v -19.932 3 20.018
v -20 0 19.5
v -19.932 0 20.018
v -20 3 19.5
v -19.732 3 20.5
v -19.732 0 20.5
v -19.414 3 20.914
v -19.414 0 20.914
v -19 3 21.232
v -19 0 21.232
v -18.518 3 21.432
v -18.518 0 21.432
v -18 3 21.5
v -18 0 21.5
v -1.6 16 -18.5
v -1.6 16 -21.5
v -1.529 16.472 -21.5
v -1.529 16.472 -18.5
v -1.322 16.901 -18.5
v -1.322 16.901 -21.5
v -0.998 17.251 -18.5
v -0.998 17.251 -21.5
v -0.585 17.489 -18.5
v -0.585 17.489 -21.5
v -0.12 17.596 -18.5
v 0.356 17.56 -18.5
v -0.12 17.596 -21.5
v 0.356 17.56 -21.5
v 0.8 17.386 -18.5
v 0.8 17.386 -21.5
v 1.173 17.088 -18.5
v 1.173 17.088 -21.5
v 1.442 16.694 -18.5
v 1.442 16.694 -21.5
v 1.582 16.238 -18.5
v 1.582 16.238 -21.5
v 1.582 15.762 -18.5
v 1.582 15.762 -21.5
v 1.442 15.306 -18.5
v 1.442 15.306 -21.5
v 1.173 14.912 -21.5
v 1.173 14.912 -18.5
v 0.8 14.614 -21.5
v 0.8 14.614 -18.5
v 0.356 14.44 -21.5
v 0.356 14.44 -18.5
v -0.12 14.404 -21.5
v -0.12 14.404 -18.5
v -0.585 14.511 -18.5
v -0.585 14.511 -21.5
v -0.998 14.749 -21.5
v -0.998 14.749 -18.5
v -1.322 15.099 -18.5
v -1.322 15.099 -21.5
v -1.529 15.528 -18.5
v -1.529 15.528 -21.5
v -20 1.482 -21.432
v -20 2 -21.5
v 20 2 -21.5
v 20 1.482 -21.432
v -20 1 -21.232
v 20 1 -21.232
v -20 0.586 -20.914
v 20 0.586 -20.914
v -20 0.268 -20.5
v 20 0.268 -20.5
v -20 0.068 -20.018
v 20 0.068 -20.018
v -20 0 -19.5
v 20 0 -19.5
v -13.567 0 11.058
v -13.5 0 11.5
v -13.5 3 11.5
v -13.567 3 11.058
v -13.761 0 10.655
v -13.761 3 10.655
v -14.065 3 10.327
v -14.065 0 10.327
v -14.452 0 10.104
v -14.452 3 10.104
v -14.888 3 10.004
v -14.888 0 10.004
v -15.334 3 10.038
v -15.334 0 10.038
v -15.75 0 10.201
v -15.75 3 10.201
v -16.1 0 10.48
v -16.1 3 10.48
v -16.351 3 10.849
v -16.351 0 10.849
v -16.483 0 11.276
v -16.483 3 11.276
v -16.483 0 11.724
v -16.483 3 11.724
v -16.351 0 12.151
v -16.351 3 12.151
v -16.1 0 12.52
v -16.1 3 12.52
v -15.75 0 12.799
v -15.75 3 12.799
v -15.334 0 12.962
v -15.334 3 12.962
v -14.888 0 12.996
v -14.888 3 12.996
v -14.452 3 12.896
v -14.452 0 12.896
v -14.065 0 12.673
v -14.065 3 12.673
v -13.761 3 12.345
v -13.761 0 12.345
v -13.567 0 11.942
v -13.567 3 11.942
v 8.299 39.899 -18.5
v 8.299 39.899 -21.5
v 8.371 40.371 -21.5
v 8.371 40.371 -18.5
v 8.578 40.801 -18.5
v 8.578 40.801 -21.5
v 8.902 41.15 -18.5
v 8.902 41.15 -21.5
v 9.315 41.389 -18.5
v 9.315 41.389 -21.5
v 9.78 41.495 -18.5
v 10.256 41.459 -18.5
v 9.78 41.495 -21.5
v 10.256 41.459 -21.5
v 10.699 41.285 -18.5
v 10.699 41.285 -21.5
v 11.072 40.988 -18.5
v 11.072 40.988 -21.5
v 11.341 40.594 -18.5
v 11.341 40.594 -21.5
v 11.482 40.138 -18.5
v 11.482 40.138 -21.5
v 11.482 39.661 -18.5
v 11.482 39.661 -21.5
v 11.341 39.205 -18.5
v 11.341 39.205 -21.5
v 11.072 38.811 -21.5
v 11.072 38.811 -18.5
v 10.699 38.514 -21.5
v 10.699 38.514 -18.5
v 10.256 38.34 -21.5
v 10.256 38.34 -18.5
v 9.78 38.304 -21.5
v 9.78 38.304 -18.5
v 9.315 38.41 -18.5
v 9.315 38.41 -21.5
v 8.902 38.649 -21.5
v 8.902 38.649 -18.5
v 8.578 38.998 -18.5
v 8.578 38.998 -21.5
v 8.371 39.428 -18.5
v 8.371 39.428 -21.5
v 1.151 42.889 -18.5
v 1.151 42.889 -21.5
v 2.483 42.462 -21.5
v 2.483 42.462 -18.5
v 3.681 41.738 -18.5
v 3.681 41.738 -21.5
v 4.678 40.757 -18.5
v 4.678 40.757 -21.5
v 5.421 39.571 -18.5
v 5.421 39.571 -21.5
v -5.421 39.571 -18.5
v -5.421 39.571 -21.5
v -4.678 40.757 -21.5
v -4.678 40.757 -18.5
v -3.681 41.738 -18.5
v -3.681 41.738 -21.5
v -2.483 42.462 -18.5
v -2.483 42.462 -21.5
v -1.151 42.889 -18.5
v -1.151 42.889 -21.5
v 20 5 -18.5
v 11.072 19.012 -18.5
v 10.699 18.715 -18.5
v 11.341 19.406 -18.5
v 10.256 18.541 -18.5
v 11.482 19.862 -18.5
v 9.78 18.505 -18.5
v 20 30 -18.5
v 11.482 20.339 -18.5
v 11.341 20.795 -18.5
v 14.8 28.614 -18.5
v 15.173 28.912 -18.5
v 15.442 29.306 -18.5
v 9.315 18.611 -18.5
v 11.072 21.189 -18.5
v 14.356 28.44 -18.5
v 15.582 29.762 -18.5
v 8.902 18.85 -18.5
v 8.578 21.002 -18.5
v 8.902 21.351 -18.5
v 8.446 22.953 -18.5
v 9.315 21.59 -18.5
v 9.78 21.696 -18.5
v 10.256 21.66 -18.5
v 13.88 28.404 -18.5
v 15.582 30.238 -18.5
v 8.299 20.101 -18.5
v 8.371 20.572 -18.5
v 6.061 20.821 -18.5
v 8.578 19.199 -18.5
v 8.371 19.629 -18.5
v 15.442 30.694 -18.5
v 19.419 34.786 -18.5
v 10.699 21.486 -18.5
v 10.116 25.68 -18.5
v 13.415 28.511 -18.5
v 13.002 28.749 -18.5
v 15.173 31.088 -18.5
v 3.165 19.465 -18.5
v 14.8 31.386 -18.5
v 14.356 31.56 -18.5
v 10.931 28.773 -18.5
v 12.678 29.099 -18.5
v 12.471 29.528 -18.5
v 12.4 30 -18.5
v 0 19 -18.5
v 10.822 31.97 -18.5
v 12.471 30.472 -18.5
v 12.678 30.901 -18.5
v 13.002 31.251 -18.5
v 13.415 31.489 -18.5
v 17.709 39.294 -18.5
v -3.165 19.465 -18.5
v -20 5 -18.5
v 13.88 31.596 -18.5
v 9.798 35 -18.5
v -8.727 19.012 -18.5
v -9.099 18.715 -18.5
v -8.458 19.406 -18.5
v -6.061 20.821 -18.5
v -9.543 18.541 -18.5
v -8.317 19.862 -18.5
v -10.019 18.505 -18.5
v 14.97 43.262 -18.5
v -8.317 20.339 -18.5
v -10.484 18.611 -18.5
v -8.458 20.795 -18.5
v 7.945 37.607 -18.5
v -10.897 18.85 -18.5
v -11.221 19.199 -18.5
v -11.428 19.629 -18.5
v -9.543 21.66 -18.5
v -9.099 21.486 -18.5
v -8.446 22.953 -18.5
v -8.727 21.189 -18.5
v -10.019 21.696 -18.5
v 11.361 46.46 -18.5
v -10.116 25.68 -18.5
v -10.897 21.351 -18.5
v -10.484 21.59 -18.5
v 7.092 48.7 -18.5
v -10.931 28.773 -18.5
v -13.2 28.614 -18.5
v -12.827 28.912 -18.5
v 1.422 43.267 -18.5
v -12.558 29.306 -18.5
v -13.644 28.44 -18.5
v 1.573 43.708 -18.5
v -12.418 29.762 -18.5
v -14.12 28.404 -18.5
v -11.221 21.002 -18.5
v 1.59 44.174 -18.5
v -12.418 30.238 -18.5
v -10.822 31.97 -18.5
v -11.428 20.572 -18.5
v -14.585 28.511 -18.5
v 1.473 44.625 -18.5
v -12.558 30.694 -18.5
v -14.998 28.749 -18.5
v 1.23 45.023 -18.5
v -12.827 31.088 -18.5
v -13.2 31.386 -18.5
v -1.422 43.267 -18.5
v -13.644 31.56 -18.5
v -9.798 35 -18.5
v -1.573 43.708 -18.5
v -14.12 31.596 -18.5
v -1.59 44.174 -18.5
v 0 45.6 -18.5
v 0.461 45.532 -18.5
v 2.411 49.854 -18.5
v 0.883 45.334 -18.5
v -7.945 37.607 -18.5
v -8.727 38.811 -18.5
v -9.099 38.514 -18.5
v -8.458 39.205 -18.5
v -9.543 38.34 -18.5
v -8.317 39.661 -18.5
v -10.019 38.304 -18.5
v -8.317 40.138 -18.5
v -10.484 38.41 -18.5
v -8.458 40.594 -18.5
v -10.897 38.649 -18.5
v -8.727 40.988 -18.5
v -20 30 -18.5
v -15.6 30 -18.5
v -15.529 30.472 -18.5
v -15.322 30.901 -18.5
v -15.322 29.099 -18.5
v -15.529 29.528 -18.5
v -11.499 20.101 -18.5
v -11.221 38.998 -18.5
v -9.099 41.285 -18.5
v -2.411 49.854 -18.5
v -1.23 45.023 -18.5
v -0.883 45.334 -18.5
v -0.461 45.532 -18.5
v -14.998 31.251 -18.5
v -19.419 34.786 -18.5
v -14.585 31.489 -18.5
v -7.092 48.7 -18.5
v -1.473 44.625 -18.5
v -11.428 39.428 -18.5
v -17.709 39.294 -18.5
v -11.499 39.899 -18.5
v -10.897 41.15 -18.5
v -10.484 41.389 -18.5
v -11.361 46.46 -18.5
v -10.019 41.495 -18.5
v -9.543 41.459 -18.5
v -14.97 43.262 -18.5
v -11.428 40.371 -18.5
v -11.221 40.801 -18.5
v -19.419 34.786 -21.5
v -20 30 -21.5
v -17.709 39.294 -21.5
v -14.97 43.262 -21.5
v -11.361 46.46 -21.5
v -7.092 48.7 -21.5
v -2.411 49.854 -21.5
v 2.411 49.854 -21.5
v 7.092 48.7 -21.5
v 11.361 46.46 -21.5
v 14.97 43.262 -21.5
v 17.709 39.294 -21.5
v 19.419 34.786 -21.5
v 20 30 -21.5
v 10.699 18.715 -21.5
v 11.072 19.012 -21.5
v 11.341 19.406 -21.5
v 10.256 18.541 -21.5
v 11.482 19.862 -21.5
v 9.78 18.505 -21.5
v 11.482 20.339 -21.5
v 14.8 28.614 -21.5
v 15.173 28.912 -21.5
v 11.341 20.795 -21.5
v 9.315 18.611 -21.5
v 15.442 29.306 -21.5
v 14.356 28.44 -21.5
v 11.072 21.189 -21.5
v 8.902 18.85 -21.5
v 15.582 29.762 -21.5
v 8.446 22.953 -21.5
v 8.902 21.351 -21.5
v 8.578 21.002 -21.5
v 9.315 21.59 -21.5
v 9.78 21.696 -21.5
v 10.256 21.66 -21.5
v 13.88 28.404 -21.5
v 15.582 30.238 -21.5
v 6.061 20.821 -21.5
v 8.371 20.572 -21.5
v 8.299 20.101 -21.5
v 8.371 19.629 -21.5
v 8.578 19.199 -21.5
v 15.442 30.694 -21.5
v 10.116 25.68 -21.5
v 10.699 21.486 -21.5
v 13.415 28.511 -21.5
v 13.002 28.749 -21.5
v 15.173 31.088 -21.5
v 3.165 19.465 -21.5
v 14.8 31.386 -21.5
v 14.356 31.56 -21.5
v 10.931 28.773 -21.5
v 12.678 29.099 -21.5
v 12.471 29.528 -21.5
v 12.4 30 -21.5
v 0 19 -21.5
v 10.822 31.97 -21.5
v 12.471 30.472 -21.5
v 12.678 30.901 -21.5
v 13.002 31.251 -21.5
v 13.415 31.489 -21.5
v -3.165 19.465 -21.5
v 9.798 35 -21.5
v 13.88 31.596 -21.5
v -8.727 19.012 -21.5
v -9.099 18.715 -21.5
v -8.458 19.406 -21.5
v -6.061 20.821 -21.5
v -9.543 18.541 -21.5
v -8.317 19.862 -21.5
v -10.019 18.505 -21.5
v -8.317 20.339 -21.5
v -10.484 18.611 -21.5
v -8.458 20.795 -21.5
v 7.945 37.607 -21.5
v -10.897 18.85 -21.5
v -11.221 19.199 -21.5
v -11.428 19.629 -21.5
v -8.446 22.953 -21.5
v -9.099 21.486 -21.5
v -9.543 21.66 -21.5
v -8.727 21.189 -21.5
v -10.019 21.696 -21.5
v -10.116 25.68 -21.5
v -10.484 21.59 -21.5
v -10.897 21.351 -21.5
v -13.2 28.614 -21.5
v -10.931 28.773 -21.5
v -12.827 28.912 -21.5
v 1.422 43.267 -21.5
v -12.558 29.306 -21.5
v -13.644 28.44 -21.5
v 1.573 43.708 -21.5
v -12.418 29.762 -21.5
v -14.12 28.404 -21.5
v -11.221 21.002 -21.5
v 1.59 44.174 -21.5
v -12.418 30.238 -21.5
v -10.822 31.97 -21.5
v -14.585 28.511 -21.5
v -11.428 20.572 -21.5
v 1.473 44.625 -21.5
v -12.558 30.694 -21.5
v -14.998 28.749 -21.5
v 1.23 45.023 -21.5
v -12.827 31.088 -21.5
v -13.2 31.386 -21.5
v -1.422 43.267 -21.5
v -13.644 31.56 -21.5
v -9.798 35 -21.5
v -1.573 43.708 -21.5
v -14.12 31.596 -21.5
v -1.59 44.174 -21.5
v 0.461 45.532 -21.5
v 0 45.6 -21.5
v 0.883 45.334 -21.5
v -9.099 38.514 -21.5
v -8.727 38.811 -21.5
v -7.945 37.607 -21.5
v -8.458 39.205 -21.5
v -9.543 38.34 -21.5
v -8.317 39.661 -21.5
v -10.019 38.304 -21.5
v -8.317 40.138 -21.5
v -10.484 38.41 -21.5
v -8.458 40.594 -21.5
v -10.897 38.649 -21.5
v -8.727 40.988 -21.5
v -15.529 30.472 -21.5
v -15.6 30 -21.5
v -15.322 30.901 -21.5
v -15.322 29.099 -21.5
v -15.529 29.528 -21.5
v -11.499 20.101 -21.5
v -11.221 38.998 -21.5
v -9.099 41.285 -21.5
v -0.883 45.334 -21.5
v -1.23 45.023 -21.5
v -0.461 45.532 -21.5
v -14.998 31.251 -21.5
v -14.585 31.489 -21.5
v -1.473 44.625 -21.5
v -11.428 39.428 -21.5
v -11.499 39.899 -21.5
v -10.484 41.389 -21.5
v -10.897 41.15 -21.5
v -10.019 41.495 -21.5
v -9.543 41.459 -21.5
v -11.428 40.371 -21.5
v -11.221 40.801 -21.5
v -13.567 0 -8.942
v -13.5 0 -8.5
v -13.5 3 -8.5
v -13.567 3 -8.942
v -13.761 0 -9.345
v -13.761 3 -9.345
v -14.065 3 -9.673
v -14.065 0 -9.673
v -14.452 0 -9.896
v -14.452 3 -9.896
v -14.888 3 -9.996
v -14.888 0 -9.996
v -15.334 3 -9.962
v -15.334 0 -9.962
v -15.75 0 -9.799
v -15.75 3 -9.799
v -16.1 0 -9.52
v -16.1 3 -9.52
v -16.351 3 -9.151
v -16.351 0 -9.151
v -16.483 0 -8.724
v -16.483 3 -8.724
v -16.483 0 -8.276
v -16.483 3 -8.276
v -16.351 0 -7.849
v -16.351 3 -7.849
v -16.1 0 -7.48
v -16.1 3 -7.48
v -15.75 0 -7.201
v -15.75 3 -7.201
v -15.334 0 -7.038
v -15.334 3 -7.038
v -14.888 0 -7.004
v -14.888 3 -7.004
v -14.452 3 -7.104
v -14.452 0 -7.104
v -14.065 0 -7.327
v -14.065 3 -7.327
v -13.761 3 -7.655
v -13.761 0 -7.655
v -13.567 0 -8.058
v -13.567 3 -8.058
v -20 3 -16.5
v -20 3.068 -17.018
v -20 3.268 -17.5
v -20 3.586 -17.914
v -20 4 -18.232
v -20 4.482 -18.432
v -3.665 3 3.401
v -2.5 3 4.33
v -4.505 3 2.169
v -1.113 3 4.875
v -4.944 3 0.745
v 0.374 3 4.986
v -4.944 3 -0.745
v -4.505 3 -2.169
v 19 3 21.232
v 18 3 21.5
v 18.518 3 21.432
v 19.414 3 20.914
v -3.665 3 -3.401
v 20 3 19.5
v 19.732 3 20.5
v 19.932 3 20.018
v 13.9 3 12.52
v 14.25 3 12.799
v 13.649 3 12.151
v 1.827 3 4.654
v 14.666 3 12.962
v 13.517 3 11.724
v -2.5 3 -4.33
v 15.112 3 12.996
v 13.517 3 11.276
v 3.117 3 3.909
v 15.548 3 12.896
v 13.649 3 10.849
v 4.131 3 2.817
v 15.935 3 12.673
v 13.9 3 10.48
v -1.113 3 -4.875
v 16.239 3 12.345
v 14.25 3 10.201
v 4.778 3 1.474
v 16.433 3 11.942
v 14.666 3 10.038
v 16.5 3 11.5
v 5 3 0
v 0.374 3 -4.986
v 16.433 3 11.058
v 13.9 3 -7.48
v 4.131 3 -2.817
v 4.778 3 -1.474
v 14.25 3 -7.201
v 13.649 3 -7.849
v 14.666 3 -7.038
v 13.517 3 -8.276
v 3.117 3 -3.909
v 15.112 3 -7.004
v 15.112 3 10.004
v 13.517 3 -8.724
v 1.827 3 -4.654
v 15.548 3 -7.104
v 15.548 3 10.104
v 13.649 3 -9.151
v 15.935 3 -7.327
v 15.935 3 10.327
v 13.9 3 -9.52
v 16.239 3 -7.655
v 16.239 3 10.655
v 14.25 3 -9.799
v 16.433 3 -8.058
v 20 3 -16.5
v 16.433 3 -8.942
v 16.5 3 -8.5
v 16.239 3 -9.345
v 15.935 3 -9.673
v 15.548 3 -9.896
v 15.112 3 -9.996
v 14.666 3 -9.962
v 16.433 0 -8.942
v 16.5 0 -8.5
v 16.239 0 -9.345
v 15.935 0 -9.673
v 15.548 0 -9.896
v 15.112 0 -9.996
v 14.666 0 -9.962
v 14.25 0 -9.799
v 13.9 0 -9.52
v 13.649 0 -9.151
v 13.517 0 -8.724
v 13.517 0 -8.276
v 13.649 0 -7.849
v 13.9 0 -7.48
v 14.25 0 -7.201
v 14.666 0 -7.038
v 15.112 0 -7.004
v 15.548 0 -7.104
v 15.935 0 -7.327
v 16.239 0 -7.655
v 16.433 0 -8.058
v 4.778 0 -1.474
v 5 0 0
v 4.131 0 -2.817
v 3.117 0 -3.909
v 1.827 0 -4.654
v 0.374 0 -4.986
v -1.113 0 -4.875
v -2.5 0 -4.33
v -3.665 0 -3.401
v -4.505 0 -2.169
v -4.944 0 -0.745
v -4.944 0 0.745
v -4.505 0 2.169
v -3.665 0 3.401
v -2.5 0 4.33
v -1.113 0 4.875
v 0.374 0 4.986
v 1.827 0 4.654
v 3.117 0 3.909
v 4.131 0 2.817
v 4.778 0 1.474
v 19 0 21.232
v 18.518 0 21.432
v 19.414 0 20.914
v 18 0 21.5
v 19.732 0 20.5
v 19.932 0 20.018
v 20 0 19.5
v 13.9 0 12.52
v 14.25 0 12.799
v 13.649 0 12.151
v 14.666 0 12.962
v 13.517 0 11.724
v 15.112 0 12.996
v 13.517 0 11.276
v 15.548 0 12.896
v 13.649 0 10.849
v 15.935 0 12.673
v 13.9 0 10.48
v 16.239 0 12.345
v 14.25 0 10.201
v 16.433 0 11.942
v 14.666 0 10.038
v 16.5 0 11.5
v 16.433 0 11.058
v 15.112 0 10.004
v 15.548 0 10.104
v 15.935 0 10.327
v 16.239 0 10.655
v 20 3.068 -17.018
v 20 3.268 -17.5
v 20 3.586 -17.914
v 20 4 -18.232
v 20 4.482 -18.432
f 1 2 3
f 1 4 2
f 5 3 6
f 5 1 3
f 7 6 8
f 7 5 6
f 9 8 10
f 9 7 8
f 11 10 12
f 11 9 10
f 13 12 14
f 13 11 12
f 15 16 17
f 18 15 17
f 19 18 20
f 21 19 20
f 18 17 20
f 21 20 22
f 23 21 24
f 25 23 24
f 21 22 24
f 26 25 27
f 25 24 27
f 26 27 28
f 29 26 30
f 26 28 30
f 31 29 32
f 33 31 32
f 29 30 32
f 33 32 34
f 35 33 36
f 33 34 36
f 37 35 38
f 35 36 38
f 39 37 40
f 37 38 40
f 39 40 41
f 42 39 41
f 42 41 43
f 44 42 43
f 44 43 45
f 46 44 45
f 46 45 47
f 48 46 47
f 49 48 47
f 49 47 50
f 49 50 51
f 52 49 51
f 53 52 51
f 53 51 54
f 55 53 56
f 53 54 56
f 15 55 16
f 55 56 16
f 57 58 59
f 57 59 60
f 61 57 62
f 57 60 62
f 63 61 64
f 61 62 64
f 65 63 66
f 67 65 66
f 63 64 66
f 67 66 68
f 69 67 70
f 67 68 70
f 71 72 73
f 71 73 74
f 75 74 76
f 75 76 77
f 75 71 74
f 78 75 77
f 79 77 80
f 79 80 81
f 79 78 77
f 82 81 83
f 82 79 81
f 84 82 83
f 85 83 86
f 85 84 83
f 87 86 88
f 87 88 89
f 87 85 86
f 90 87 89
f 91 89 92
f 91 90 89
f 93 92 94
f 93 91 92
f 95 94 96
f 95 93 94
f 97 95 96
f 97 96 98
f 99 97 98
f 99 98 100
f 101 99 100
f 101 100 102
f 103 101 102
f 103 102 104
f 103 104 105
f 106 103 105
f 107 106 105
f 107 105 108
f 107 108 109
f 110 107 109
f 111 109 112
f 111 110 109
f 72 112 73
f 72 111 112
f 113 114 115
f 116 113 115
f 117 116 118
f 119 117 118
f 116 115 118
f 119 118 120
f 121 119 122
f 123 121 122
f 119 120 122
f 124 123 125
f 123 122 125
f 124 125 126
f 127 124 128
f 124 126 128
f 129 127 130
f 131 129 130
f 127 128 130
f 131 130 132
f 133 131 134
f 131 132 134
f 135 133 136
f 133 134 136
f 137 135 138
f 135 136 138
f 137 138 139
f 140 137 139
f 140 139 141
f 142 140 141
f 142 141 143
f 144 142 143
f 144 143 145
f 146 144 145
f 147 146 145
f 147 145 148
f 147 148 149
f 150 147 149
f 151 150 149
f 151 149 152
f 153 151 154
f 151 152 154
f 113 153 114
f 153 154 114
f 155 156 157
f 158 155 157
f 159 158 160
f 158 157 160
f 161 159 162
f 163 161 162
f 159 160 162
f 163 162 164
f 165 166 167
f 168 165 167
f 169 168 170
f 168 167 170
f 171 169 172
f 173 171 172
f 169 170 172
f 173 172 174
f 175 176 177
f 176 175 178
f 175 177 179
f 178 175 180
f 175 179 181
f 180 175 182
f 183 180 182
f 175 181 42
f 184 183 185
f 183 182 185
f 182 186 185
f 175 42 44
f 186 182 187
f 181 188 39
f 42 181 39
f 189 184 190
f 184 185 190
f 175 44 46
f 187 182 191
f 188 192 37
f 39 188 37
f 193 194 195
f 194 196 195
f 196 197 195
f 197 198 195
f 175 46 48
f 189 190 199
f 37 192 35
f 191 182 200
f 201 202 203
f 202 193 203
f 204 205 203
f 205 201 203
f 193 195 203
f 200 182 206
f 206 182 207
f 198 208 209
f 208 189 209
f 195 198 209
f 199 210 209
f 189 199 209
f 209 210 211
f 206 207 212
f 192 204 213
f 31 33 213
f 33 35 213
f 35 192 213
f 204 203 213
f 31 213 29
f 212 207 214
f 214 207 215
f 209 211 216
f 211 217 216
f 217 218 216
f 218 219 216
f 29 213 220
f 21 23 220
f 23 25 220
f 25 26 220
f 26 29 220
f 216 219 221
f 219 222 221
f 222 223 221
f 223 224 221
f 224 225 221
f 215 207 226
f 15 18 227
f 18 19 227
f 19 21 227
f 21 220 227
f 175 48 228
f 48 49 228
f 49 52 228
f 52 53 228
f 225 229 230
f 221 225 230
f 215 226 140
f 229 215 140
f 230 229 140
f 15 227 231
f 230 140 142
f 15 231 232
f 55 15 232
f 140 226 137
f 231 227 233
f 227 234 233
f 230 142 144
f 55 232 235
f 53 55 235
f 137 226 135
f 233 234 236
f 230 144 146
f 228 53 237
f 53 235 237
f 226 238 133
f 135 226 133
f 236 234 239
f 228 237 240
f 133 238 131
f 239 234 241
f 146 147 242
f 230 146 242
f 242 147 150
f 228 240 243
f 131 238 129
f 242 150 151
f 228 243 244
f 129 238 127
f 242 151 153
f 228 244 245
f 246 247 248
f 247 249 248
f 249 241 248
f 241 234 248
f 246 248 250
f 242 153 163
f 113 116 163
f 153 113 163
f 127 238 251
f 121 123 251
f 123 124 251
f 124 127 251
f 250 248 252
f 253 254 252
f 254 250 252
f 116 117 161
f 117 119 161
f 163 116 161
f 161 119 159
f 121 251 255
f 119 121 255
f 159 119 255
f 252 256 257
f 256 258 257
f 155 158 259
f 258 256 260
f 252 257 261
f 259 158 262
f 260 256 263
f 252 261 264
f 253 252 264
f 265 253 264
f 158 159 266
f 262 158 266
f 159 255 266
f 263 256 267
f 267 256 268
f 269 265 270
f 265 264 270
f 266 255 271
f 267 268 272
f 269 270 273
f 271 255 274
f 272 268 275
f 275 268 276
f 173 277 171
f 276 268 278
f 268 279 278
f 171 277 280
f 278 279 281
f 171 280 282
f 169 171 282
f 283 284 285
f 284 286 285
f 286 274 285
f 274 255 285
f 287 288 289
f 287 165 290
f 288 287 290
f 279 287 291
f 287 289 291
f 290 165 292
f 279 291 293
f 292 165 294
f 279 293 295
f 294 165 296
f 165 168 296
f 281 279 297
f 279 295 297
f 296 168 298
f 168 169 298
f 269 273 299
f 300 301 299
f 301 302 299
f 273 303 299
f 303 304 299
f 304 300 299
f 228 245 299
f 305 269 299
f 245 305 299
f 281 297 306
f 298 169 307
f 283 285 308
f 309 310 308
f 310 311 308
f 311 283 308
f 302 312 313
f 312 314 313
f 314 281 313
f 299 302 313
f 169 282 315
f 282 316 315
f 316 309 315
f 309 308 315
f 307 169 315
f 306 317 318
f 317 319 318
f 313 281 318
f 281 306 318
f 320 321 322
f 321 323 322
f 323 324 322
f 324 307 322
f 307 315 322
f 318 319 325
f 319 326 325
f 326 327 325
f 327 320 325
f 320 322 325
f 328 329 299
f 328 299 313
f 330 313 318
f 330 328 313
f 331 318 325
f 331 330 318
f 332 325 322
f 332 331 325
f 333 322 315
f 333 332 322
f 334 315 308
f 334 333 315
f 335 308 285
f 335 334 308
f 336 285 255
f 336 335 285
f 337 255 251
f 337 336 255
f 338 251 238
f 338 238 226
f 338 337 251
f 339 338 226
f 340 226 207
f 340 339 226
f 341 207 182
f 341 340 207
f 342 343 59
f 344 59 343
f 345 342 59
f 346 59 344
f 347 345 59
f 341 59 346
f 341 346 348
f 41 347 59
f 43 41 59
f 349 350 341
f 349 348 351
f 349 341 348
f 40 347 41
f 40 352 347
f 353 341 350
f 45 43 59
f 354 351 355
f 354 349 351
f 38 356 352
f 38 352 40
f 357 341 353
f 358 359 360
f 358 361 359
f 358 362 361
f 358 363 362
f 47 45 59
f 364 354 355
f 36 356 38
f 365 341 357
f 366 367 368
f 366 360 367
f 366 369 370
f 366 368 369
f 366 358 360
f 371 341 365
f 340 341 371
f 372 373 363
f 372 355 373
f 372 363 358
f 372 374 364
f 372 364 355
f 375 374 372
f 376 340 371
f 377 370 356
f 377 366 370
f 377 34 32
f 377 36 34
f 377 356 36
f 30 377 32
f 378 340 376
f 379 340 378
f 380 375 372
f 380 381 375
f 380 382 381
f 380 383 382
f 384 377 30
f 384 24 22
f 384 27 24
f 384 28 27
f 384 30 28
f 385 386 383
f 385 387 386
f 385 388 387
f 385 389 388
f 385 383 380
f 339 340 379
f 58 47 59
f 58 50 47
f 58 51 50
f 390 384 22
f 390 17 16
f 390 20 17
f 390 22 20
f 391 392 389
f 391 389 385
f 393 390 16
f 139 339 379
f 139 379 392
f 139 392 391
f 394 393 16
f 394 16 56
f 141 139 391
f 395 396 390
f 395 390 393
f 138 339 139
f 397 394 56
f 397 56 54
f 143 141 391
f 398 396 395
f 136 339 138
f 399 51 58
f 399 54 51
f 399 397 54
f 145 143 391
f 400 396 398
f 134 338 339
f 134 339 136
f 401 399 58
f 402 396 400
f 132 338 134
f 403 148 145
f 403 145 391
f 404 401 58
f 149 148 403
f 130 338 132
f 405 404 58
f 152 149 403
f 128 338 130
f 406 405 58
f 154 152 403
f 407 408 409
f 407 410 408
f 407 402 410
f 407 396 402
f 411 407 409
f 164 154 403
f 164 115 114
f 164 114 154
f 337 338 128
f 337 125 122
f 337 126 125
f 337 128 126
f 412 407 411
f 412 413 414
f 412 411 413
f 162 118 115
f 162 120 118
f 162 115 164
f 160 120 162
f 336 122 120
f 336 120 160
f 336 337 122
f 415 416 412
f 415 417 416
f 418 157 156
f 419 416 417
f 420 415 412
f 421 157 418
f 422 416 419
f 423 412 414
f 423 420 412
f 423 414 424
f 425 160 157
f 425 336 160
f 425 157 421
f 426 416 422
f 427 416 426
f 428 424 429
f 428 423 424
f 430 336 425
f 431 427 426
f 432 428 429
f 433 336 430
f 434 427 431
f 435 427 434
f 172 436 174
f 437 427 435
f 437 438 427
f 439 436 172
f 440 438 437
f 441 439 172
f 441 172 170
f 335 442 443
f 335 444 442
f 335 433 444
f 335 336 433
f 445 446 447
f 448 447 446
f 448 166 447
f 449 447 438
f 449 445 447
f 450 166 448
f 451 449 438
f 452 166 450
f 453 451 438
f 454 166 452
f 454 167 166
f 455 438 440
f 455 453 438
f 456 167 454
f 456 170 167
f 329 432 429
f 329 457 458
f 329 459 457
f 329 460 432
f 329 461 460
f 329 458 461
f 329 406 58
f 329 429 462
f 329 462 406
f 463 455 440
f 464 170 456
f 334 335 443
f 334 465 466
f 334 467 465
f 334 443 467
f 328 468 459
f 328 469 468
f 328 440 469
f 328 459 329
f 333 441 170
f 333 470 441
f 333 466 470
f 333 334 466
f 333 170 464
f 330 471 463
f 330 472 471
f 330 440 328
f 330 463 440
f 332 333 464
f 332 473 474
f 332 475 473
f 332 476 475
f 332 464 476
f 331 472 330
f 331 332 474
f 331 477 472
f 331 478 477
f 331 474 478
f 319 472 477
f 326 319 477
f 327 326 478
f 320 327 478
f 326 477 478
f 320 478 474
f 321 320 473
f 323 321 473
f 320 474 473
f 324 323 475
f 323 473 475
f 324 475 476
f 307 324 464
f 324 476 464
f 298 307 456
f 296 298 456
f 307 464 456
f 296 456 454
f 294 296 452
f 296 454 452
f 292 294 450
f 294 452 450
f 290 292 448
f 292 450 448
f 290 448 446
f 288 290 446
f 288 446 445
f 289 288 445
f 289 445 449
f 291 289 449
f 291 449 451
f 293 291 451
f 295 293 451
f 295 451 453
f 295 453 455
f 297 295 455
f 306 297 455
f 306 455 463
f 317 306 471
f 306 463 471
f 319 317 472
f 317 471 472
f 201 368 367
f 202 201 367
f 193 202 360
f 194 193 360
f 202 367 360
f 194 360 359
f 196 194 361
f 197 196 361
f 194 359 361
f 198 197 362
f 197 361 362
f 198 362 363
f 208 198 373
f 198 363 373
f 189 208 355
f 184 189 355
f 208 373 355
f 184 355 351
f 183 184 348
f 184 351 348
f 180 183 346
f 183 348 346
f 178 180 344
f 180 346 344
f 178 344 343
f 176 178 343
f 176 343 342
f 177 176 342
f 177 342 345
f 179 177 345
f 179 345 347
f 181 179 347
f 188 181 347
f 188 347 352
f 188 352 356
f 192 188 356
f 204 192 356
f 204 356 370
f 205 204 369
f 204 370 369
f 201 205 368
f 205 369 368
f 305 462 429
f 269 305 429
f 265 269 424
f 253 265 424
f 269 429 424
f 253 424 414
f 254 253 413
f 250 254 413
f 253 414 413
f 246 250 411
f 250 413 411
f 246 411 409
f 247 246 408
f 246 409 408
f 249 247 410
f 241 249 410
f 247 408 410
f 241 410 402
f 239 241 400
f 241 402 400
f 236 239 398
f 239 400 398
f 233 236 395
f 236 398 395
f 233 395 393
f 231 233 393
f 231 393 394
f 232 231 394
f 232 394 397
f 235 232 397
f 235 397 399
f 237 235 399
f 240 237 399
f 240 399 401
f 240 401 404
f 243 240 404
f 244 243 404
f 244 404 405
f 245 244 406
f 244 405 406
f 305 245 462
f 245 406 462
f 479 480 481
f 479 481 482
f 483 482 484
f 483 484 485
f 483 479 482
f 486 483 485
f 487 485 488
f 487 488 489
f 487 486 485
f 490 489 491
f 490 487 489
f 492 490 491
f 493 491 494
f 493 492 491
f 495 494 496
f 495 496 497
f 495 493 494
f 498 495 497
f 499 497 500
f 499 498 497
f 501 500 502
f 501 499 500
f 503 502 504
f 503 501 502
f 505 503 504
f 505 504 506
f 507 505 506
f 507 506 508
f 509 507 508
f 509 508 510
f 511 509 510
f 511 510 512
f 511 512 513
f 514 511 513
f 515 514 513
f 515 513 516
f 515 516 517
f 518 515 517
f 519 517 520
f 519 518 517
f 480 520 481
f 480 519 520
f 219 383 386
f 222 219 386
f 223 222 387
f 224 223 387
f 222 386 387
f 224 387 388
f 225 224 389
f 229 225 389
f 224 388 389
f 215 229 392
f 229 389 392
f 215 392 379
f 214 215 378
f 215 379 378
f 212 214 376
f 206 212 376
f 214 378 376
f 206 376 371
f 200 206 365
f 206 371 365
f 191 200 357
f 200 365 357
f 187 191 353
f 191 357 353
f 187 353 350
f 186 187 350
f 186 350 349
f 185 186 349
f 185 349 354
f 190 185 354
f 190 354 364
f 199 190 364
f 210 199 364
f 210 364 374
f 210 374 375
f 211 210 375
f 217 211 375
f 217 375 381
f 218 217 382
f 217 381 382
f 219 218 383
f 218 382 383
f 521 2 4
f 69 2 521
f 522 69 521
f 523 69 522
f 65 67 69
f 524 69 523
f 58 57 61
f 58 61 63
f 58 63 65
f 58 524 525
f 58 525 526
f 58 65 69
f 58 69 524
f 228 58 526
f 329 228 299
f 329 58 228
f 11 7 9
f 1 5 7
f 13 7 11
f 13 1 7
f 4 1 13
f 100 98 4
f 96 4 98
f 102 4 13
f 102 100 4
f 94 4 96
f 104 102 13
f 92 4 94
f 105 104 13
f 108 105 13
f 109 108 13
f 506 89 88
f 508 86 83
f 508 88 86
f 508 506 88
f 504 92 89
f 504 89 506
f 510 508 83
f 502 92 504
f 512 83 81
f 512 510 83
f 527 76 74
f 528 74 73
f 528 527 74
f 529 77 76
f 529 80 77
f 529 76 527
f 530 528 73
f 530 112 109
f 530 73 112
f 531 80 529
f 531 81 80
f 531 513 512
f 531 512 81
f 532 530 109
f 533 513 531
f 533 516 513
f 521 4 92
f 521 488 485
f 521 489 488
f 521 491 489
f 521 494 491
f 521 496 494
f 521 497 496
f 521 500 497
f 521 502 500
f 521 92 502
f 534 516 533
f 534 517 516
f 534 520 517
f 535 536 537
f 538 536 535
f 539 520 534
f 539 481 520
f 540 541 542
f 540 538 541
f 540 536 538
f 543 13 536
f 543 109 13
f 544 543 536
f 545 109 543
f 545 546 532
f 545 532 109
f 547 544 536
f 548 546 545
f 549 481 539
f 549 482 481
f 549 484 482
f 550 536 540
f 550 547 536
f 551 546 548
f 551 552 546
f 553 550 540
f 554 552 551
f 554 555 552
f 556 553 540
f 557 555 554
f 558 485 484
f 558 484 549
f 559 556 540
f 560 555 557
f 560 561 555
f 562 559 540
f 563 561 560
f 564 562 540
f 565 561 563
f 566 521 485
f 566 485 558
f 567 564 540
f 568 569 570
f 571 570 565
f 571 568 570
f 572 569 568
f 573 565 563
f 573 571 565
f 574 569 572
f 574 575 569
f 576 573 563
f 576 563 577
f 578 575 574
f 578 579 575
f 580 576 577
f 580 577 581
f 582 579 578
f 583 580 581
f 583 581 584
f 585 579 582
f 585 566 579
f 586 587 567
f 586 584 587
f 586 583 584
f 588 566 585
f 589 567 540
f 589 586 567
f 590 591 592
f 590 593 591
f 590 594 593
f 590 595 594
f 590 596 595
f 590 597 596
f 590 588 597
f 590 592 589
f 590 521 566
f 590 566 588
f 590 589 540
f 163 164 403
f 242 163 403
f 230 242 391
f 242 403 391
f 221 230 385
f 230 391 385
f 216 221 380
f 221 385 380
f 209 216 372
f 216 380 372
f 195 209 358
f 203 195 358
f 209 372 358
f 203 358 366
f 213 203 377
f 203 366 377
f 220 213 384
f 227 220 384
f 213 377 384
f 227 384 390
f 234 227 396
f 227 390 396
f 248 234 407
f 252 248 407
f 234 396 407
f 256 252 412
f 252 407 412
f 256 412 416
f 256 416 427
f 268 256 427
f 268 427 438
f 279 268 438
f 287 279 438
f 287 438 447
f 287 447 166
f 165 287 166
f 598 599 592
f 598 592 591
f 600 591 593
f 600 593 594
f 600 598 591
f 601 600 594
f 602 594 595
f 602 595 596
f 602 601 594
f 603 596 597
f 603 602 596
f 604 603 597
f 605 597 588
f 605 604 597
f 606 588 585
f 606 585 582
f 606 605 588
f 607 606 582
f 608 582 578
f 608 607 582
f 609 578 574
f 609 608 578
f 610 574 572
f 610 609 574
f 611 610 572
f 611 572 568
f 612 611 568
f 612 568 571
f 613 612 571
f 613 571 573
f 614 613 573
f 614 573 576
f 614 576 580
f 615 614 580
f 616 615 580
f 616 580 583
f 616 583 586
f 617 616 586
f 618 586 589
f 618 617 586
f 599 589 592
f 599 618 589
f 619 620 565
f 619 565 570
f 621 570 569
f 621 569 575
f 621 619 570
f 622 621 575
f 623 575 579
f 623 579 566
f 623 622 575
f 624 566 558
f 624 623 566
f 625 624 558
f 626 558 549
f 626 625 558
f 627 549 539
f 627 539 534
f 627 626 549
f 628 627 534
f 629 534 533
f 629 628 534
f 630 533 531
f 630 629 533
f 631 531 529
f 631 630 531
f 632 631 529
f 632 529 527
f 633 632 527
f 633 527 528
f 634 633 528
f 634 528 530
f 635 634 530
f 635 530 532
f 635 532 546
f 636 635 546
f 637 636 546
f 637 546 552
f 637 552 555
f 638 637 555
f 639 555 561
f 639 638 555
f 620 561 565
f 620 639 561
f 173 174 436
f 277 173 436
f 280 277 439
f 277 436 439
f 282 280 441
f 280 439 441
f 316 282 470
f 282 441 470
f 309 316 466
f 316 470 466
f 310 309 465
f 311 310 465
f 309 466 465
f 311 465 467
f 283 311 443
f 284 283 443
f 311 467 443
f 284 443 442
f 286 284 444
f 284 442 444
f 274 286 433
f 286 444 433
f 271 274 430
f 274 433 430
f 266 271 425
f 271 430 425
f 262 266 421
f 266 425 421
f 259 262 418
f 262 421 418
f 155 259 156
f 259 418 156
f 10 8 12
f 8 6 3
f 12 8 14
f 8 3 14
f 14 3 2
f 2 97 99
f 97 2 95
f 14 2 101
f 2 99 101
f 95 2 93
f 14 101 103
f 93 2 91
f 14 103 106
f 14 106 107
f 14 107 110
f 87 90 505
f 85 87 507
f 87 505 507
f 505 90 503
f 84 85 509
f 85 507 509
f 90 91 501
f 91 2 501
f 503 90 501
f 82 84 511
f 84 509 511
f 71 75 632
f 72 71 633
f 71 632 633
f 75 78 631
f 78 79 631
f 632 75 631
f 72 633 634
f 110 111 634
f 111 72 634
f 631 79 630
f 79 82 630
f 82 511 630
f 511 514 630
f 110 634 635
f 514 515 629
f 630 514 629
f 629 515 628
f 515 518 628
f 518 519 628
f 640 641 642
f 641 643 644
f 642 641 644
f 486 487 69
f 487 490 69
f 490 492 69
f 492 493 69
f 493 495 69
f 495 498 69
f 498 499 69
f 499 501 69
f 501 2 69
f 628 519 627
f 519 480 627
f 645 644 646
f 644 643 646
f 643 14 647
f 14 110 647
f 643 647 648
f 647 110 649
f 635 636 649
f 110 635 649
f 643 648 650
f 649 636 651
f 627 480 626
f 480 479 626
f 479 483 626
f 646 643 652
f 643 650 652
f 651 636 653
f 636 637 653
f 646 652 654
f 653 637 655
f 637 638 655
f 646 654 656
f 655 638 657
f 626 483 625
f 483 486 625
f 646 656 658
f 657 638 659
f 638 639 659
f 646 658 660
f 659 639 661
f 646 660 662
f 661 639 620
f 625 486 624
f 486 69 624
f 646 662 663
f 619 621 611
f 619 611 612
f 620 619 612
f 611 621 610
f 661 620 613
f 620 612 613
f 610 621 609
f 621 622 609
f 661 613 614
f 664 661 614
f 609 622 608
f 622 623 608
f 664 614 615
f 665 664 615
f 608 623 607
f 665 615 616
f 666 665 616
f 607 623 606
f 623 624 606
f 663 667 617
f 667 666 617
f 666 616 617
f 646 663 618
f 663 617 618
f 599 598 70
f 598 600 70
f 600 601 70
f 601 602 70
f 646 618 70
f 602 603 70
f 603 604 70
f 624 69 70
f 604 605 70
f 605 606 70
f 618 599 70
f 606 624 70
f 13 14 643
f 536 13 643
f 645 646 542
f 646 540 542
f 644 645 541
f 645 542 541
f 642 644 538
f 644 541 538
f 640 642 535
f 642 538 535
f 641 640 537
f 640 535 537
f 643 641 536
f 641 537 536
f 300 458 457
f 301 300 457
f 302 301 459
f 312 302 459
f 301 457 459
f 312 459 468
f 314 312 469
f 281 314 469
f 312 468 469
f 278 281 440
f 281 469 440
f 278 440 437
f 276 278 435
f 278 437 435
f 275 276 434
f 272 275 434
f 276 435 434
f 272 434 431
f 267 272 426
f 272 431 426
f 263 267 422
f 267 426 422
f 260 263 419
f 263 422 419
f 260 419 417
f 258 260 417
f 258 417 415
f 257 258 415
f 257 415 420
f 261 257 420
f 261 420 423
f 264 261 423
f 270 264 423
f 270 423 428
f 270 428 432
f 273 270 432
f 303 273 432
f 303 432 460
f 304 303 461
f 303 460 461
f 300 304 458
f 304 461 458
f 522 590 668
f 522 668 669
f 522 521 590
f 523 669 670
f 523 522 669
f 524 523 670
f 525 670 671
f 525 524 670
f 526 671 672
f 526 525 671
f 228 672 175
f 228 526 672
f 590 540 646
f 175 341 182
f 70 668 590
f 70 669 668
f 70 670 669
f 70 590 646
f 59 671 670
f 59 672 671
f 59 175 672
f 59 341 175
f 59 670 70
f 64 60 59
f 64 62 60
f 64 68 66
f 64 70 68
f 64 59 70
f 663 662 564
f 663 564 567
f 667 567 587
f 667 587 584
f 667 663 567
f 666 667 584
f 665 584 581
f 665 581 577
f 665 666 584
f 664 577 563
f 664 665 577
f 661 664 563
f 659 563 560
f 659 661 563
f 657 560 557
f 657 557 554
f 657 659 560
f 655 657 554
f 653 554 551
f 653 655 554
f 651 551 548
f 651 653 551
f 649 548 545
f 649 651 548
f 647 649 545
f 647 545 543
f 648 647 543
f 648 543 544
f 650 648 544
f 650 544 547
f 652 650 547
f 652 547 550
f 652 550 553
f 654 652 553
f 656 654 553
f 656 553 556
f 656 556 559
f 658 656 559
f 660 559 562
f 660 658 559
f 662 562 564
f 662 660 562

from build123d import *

# Parameters (mm, degrees)
SKETCH1_W           = 40
SKETCH1_H           = 43
SKETCH1_R           = 1.5
SKETCH1_R_2         = 5
BOSS_EXTRUDE1_DEPTH = 3
SKETCH3_R           = 1.6
BOSS_EXTRUDE2_DEPTH = 3
FILLET1_R           = 2


with BuildPart() as part:
    # Sketch1 → Boss-Extrude1 (new body)
    with BuildSketch(Plane(origin=(0, 0, 0), x_dir=(1, 0, 0), z_dir=(0, 1, 0))):
        Rectangle(SKETCH1_W, SKETCH1_H)
        with Locations((-15, -11.5)):
            Circle(SKETCH1_R, mode=Mode.SUBTRACT)
        with Locations((15, -11.5)):
            Circle(SKETCH1_R, mode=Mode.SUBTRACT)
        with Locations((-15, 8.5)):
            Circle(SKETCH1_R, mode=Mode.SUBTRACT)
        with Locations((15, 8.5)):
            Circle(SKETCH1_R, mode=Mode.SUBTRACT)
        Circle(SKETCH1_R_2, mode=Mode.SUBTRACT)
    extrude(amount=BOSS_EXTRUDE1_DEPTH)

    # Sketch3 → Boss-Extrude2 (add)
    with BuildSketch(Plane(origin=(0, 0, -21.5), x_dir=(-1, 0, 0), z_dir=(0, 0, -1))):
        with BuildLine():
            Line((-20, 3), (20, 3))
            Line((20, 3), (20, 30))
            ThreePointArc((20, 30), (0, 50), (-20, 30))
            Line((-20, 30), (-20, 3))
        make_face()
        with Locations((0, 16)):
            Circle(SKETCH3_R, mode=Mode.SUBTRACT)
        with Locations((-9.899494937, 20.100505063)):
            Circle(SKETCH3_R, mode=Mode.SUBTRACT)
        with Locations((-14, 30)):
            Circle(SKETCH3_R, mode=Mode.SUBTRACT)
        with Locations((-9.899494937, 39.899494937)):
            Circle(SKETCH3_R, mode=Mode.SUBTRACT)
        with Locations((9.899494937, 39.899494937)):
            Circle(SKETCH3_R, mode=Mode.SUBTRACT)
        with Locations((14, 30)):
            Circle(SKETCH3_R, mode=Mode.SUBTRACT)
        with Locations((9.899494937, 20.100505063)):
            Circle(SKETCH3_R, mode=Mode.SUBTRACT)
        with BuildLine():
            ThreePointArc((-5.421047417, 39.571428571), (0, 19), (5.421047417, 39.571428571))
            ThreePointArc((5.421047417, 39.571428571), (3.680856516, 41.738279783), (1.15096765, 42.888571429))
            ThreePointArc((1.15096765, 42.888571429), (0, 45.6), (-1.15096765, 42.888571429))
            ThreePointArc((-1.15096765, 42.888571429), (-3.680856516, 41.738279783), (-5.421047417, 39.571428571))
        make_face(mode=Mode.SUBTRACT)
    extrude(amount=-BOSS_EXTRUDE2_DEPTH)

    # Fillet1
    fillet1_edges = [part.edges().sort_by_distance(p)[0] for p in [
        (0, 3, -18.5),
        (0, 0, -21.5),
        (20, 1.5, 21.5),
        (-20, 1.5, 21.5),
    ]]
    fillet(fillet1_edges, radius=FILLET1_R)


solid = part.part
